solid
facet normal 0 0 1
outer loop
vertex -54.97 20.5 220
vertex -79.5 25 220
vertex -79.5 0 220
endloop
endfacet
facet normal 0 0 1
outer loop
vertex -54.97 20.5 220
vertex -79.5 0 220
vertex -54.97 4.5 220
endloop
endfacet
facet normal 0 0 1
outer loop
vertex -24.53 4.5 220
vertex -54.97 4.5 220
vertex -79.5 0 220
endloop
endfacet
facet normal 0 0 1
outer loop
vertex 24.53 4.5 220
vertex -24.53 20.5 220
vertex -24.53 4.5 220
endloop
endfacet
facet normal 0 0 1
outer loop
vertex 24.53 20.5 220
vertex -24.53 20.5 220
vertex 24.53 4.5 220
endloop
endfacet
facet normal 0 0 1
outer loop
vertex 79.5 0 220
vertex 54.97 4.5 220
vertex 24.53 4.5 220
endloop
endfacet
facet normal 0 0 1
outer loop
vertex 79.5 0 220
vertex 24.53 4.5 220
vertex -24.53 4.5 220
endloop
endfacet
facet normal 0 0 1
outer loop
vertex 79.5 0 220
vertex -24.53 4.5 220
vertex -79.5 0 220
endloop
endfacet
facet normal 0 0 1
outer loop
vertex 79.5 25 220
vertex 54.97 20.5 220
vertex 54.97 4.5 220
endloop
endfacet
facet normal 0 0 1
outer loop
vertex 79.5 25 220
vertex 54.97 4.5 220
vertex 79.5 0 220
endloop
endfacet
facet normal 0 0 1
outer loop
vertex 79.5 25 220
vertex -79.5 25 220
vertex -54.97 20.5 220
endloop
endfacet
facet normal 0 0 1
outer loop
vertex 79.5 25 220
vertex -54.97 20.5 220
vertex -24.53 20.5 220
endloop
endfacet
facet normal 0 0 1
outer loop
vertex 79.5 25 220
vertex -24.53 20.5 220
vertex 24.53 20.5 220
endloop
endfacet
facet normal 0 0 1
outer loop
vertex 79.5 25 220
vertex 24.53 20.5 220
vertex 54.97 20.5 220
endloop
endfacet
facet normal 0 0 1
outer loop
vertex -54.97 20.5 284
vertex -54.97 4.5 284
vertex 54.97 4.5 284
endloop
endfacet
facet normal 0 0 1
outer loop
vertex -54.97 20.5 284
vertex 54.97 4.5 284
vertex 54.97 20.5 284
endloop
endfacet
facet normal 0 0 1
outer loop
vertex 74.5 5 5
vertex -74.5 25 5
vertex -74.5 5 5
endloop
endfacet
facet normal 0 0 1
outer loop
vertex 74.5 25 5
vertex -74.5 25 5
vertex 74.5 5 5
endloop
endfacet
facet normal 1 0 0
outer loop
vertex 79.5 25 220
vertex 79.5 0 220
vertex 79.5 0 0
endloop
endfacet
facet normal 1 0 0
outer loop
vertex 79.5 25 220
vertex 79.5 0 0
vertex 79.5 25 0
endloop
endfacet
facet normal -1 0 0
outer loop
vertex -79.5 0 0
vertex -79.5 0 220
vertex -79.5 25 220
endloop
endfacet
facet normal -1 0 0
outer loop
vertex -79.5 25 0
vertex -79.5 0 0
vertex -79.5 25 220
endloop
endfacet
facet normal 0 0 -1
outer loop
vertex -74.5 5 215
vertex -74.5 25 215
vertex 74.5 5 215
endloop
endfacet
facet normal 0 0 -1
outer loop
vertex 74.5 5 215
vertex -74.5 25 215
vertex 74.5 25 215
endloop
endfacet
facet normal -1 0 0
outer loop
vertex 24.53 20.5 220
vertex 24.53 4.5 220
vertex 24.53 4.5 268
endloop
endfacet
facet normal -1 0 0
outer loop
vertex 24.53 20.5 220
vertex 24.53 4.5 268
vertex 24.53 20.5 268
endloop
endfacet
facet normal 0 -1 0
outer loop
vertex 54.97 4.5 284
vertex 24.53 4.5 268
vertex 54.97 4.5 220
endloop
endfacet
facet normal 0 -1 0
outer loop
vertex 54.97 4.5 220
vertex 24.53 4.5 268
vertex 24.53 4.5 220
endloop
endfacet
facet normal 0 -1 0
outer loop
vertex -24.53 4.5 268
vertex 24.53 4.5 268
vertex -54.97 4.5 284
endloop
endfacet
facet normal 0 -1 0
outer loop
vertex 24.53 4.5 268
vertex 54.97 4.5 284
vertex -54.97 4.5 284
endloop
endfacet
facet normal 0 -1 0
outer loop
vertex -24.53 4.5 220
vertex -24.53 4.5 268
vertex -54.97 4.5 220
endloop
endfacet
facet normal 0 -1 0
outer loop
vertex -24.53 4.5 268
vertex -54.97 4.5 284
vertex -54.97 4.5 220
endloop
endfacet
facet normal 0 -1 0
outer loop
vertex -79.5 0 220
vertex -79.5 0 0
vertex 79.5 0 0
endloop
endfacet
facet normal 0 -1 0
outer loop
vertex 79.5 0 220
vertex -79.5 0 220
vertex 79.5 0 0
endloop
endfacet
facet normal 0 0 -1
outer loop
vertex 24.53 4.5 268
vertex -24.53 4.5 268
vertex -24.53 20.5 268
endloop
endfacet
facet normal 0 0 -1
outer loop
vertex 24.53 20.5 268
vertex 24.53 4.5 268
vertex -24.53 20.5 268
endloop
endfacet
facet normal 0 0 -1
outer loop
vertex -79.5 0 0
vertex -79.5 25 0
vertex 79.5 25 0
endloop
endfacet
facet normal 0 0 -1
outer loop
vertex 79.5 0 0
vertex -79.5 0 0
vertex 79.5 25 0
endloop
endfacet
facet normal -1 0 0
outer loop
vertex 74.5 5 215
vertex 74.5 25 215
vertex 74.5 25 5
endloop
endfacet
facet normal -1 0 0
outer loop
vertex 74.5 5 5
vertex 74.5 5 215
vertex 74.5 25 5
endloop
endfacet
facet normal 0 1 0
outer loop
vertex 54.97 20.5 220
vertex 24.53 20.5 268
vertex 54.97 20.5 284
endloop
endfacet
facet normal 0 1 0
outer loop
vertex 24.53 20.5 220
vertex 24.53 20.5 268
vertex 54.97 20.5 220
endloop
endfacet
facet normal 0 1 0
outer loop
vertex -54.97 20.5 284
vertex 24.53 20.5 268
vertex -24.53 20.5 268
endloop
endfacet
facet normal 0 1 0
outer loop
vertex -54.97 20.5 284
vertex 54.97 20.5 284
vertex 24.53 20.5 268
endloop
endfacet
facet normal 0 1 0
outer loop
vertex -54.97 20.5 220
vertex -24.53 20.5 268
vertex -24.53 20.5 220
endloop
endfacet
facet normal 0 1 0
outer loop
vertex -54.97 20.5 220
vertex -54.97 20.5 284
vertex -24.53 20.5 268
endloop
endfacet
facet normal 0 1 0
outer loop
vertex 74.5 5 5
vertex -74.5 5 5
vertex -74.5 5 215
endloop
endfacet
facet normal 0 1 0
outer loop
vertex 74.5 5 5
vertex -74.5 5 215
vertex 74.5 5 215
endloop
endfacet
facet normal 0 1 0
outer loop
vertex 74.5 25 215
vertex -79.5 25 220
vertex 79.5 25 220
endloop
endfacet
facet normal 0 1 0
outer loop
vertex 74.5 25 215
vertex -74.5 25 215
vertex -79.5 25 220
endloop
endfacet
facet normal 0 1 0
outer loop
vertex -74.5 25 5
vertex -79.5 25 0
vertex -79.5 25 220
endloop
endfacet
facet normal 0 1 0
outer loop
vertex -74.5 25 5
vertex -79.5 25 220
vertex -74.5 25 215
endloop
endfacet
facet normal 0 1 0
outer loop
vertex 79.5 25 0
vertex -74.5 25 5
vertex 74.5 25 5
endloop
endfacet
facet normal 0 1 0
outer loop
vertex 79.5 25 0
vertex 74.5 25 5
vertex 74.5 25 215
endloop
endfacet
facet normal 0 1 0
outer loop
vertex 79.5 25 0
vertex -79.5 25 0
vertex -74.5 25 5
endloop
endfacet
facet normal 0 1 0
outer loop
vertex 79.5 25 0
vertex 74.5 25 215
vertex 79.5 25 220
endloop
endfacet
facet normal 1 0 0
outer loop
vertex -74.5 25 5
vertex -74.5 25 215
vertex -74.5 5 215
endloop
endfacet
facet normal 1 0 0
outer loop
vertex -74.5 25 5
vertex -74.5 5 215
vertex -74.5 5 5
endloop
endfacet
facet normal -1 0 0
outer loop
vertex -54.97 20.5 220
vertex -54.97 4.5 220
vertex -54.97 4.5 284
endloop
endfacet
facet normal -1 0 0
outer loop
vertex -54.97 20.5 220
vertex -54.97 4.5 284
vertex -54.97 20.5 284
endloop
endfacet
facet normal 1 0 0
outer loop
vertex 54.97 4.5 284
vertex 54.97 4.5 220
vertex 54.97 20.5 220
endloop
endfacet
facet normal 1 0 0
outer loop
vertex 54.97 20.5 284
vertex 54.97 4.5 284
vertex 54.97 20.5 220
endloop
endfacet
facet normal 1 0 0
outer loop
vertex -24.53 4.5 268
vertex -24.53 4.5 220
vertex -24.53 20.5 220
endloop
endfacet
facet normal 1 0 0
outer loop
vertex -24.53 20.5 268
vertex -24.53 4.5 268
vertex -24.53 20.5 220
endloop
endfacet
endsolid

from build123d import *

# Parameters (mm, degrees)
SKETCH1_W           = 159
SKETCH1_H           = 25
BOSS_EXTRUDE1_DEPTH = 220
SKETCH2_W           = 149
SKETCH2_H           = 210
CUT_EXTRUDE1_DEPTH  = 20
SKETCH3_W           = 30.44
SKETCH3_H           = 16
BOSS_EXTRUDE2_DEPTH = 64
BOSS_EXTRUDE3_REACH = 305.485
SKETCH4_W           = 16
SKETCH4_H           = 16


with BuildPart() as part:
    # Sketch1 → Boss-Extrude1 (new body)
    with BuildSketch(Plane.XY):
        with Locations((0, 12.5)):
            Rectangle(SKETCH1_W, SKETCH1_H)
    extrude(amount=BOSS_EXTRUDE1_DEPTH)

    # Sketch2 → Cut-Extrude1 (cut)
    with BuildSketch(Plane(origin=(0, 25, 0), x_dir=(1, 0, 0), z_dir=(0, 1, 0))):
        with Locations((0, -110)):
            Rectangle(SKETCH2_W, SKETCH2_H)
    extrude(amount=-CUT_EXTRUDE1_DEPTH, mode=Mode.SUBTRACT)

    # Sketch3 → Boss-Extrude2 (add)
    with BuildSketch(Plane.XY.offset(220)):
        with Locations((-39.75, 12.5)):
            Rectangle(SKETCH3_W, SKETCH3_H)
    boss_extrude2 = extrude(amount=BOSS_EXTRUDE2_DEPTH)

    # Mirror1: Boss-Extrude2 across plane
    add(boss_extrude2.mirror(Plane(origin=(0, 0, 0), x_dir=(0, 0, 1), z_dir=(1, 0, 0))))

    # Sketch4 → Boss-Extrude3 (add, up to next)
    with BuildSketch(Plane(origin=(-24.53, 0, 0), x_dir=(0, 0, -1), z_dir=(1, 0, 0)), mode=Mode.PRIVATE) as boss_extrude3_sk1:
        with Locations((-276, 12.5)):
            Rectangle(SKETCH4_W, SKETCH4_H)
    boss_extrude3_tool1 = extrude(boss_extrude3_sk1.sketch, amount=BOSS_EXTRUDE3_REACH, mode=Mode.PRIVATE) - part.part
    add(boss_extrude3_tool1.solids().sort_by_distance((-24.53, 12.5, 276))[0])


solid = part.part
